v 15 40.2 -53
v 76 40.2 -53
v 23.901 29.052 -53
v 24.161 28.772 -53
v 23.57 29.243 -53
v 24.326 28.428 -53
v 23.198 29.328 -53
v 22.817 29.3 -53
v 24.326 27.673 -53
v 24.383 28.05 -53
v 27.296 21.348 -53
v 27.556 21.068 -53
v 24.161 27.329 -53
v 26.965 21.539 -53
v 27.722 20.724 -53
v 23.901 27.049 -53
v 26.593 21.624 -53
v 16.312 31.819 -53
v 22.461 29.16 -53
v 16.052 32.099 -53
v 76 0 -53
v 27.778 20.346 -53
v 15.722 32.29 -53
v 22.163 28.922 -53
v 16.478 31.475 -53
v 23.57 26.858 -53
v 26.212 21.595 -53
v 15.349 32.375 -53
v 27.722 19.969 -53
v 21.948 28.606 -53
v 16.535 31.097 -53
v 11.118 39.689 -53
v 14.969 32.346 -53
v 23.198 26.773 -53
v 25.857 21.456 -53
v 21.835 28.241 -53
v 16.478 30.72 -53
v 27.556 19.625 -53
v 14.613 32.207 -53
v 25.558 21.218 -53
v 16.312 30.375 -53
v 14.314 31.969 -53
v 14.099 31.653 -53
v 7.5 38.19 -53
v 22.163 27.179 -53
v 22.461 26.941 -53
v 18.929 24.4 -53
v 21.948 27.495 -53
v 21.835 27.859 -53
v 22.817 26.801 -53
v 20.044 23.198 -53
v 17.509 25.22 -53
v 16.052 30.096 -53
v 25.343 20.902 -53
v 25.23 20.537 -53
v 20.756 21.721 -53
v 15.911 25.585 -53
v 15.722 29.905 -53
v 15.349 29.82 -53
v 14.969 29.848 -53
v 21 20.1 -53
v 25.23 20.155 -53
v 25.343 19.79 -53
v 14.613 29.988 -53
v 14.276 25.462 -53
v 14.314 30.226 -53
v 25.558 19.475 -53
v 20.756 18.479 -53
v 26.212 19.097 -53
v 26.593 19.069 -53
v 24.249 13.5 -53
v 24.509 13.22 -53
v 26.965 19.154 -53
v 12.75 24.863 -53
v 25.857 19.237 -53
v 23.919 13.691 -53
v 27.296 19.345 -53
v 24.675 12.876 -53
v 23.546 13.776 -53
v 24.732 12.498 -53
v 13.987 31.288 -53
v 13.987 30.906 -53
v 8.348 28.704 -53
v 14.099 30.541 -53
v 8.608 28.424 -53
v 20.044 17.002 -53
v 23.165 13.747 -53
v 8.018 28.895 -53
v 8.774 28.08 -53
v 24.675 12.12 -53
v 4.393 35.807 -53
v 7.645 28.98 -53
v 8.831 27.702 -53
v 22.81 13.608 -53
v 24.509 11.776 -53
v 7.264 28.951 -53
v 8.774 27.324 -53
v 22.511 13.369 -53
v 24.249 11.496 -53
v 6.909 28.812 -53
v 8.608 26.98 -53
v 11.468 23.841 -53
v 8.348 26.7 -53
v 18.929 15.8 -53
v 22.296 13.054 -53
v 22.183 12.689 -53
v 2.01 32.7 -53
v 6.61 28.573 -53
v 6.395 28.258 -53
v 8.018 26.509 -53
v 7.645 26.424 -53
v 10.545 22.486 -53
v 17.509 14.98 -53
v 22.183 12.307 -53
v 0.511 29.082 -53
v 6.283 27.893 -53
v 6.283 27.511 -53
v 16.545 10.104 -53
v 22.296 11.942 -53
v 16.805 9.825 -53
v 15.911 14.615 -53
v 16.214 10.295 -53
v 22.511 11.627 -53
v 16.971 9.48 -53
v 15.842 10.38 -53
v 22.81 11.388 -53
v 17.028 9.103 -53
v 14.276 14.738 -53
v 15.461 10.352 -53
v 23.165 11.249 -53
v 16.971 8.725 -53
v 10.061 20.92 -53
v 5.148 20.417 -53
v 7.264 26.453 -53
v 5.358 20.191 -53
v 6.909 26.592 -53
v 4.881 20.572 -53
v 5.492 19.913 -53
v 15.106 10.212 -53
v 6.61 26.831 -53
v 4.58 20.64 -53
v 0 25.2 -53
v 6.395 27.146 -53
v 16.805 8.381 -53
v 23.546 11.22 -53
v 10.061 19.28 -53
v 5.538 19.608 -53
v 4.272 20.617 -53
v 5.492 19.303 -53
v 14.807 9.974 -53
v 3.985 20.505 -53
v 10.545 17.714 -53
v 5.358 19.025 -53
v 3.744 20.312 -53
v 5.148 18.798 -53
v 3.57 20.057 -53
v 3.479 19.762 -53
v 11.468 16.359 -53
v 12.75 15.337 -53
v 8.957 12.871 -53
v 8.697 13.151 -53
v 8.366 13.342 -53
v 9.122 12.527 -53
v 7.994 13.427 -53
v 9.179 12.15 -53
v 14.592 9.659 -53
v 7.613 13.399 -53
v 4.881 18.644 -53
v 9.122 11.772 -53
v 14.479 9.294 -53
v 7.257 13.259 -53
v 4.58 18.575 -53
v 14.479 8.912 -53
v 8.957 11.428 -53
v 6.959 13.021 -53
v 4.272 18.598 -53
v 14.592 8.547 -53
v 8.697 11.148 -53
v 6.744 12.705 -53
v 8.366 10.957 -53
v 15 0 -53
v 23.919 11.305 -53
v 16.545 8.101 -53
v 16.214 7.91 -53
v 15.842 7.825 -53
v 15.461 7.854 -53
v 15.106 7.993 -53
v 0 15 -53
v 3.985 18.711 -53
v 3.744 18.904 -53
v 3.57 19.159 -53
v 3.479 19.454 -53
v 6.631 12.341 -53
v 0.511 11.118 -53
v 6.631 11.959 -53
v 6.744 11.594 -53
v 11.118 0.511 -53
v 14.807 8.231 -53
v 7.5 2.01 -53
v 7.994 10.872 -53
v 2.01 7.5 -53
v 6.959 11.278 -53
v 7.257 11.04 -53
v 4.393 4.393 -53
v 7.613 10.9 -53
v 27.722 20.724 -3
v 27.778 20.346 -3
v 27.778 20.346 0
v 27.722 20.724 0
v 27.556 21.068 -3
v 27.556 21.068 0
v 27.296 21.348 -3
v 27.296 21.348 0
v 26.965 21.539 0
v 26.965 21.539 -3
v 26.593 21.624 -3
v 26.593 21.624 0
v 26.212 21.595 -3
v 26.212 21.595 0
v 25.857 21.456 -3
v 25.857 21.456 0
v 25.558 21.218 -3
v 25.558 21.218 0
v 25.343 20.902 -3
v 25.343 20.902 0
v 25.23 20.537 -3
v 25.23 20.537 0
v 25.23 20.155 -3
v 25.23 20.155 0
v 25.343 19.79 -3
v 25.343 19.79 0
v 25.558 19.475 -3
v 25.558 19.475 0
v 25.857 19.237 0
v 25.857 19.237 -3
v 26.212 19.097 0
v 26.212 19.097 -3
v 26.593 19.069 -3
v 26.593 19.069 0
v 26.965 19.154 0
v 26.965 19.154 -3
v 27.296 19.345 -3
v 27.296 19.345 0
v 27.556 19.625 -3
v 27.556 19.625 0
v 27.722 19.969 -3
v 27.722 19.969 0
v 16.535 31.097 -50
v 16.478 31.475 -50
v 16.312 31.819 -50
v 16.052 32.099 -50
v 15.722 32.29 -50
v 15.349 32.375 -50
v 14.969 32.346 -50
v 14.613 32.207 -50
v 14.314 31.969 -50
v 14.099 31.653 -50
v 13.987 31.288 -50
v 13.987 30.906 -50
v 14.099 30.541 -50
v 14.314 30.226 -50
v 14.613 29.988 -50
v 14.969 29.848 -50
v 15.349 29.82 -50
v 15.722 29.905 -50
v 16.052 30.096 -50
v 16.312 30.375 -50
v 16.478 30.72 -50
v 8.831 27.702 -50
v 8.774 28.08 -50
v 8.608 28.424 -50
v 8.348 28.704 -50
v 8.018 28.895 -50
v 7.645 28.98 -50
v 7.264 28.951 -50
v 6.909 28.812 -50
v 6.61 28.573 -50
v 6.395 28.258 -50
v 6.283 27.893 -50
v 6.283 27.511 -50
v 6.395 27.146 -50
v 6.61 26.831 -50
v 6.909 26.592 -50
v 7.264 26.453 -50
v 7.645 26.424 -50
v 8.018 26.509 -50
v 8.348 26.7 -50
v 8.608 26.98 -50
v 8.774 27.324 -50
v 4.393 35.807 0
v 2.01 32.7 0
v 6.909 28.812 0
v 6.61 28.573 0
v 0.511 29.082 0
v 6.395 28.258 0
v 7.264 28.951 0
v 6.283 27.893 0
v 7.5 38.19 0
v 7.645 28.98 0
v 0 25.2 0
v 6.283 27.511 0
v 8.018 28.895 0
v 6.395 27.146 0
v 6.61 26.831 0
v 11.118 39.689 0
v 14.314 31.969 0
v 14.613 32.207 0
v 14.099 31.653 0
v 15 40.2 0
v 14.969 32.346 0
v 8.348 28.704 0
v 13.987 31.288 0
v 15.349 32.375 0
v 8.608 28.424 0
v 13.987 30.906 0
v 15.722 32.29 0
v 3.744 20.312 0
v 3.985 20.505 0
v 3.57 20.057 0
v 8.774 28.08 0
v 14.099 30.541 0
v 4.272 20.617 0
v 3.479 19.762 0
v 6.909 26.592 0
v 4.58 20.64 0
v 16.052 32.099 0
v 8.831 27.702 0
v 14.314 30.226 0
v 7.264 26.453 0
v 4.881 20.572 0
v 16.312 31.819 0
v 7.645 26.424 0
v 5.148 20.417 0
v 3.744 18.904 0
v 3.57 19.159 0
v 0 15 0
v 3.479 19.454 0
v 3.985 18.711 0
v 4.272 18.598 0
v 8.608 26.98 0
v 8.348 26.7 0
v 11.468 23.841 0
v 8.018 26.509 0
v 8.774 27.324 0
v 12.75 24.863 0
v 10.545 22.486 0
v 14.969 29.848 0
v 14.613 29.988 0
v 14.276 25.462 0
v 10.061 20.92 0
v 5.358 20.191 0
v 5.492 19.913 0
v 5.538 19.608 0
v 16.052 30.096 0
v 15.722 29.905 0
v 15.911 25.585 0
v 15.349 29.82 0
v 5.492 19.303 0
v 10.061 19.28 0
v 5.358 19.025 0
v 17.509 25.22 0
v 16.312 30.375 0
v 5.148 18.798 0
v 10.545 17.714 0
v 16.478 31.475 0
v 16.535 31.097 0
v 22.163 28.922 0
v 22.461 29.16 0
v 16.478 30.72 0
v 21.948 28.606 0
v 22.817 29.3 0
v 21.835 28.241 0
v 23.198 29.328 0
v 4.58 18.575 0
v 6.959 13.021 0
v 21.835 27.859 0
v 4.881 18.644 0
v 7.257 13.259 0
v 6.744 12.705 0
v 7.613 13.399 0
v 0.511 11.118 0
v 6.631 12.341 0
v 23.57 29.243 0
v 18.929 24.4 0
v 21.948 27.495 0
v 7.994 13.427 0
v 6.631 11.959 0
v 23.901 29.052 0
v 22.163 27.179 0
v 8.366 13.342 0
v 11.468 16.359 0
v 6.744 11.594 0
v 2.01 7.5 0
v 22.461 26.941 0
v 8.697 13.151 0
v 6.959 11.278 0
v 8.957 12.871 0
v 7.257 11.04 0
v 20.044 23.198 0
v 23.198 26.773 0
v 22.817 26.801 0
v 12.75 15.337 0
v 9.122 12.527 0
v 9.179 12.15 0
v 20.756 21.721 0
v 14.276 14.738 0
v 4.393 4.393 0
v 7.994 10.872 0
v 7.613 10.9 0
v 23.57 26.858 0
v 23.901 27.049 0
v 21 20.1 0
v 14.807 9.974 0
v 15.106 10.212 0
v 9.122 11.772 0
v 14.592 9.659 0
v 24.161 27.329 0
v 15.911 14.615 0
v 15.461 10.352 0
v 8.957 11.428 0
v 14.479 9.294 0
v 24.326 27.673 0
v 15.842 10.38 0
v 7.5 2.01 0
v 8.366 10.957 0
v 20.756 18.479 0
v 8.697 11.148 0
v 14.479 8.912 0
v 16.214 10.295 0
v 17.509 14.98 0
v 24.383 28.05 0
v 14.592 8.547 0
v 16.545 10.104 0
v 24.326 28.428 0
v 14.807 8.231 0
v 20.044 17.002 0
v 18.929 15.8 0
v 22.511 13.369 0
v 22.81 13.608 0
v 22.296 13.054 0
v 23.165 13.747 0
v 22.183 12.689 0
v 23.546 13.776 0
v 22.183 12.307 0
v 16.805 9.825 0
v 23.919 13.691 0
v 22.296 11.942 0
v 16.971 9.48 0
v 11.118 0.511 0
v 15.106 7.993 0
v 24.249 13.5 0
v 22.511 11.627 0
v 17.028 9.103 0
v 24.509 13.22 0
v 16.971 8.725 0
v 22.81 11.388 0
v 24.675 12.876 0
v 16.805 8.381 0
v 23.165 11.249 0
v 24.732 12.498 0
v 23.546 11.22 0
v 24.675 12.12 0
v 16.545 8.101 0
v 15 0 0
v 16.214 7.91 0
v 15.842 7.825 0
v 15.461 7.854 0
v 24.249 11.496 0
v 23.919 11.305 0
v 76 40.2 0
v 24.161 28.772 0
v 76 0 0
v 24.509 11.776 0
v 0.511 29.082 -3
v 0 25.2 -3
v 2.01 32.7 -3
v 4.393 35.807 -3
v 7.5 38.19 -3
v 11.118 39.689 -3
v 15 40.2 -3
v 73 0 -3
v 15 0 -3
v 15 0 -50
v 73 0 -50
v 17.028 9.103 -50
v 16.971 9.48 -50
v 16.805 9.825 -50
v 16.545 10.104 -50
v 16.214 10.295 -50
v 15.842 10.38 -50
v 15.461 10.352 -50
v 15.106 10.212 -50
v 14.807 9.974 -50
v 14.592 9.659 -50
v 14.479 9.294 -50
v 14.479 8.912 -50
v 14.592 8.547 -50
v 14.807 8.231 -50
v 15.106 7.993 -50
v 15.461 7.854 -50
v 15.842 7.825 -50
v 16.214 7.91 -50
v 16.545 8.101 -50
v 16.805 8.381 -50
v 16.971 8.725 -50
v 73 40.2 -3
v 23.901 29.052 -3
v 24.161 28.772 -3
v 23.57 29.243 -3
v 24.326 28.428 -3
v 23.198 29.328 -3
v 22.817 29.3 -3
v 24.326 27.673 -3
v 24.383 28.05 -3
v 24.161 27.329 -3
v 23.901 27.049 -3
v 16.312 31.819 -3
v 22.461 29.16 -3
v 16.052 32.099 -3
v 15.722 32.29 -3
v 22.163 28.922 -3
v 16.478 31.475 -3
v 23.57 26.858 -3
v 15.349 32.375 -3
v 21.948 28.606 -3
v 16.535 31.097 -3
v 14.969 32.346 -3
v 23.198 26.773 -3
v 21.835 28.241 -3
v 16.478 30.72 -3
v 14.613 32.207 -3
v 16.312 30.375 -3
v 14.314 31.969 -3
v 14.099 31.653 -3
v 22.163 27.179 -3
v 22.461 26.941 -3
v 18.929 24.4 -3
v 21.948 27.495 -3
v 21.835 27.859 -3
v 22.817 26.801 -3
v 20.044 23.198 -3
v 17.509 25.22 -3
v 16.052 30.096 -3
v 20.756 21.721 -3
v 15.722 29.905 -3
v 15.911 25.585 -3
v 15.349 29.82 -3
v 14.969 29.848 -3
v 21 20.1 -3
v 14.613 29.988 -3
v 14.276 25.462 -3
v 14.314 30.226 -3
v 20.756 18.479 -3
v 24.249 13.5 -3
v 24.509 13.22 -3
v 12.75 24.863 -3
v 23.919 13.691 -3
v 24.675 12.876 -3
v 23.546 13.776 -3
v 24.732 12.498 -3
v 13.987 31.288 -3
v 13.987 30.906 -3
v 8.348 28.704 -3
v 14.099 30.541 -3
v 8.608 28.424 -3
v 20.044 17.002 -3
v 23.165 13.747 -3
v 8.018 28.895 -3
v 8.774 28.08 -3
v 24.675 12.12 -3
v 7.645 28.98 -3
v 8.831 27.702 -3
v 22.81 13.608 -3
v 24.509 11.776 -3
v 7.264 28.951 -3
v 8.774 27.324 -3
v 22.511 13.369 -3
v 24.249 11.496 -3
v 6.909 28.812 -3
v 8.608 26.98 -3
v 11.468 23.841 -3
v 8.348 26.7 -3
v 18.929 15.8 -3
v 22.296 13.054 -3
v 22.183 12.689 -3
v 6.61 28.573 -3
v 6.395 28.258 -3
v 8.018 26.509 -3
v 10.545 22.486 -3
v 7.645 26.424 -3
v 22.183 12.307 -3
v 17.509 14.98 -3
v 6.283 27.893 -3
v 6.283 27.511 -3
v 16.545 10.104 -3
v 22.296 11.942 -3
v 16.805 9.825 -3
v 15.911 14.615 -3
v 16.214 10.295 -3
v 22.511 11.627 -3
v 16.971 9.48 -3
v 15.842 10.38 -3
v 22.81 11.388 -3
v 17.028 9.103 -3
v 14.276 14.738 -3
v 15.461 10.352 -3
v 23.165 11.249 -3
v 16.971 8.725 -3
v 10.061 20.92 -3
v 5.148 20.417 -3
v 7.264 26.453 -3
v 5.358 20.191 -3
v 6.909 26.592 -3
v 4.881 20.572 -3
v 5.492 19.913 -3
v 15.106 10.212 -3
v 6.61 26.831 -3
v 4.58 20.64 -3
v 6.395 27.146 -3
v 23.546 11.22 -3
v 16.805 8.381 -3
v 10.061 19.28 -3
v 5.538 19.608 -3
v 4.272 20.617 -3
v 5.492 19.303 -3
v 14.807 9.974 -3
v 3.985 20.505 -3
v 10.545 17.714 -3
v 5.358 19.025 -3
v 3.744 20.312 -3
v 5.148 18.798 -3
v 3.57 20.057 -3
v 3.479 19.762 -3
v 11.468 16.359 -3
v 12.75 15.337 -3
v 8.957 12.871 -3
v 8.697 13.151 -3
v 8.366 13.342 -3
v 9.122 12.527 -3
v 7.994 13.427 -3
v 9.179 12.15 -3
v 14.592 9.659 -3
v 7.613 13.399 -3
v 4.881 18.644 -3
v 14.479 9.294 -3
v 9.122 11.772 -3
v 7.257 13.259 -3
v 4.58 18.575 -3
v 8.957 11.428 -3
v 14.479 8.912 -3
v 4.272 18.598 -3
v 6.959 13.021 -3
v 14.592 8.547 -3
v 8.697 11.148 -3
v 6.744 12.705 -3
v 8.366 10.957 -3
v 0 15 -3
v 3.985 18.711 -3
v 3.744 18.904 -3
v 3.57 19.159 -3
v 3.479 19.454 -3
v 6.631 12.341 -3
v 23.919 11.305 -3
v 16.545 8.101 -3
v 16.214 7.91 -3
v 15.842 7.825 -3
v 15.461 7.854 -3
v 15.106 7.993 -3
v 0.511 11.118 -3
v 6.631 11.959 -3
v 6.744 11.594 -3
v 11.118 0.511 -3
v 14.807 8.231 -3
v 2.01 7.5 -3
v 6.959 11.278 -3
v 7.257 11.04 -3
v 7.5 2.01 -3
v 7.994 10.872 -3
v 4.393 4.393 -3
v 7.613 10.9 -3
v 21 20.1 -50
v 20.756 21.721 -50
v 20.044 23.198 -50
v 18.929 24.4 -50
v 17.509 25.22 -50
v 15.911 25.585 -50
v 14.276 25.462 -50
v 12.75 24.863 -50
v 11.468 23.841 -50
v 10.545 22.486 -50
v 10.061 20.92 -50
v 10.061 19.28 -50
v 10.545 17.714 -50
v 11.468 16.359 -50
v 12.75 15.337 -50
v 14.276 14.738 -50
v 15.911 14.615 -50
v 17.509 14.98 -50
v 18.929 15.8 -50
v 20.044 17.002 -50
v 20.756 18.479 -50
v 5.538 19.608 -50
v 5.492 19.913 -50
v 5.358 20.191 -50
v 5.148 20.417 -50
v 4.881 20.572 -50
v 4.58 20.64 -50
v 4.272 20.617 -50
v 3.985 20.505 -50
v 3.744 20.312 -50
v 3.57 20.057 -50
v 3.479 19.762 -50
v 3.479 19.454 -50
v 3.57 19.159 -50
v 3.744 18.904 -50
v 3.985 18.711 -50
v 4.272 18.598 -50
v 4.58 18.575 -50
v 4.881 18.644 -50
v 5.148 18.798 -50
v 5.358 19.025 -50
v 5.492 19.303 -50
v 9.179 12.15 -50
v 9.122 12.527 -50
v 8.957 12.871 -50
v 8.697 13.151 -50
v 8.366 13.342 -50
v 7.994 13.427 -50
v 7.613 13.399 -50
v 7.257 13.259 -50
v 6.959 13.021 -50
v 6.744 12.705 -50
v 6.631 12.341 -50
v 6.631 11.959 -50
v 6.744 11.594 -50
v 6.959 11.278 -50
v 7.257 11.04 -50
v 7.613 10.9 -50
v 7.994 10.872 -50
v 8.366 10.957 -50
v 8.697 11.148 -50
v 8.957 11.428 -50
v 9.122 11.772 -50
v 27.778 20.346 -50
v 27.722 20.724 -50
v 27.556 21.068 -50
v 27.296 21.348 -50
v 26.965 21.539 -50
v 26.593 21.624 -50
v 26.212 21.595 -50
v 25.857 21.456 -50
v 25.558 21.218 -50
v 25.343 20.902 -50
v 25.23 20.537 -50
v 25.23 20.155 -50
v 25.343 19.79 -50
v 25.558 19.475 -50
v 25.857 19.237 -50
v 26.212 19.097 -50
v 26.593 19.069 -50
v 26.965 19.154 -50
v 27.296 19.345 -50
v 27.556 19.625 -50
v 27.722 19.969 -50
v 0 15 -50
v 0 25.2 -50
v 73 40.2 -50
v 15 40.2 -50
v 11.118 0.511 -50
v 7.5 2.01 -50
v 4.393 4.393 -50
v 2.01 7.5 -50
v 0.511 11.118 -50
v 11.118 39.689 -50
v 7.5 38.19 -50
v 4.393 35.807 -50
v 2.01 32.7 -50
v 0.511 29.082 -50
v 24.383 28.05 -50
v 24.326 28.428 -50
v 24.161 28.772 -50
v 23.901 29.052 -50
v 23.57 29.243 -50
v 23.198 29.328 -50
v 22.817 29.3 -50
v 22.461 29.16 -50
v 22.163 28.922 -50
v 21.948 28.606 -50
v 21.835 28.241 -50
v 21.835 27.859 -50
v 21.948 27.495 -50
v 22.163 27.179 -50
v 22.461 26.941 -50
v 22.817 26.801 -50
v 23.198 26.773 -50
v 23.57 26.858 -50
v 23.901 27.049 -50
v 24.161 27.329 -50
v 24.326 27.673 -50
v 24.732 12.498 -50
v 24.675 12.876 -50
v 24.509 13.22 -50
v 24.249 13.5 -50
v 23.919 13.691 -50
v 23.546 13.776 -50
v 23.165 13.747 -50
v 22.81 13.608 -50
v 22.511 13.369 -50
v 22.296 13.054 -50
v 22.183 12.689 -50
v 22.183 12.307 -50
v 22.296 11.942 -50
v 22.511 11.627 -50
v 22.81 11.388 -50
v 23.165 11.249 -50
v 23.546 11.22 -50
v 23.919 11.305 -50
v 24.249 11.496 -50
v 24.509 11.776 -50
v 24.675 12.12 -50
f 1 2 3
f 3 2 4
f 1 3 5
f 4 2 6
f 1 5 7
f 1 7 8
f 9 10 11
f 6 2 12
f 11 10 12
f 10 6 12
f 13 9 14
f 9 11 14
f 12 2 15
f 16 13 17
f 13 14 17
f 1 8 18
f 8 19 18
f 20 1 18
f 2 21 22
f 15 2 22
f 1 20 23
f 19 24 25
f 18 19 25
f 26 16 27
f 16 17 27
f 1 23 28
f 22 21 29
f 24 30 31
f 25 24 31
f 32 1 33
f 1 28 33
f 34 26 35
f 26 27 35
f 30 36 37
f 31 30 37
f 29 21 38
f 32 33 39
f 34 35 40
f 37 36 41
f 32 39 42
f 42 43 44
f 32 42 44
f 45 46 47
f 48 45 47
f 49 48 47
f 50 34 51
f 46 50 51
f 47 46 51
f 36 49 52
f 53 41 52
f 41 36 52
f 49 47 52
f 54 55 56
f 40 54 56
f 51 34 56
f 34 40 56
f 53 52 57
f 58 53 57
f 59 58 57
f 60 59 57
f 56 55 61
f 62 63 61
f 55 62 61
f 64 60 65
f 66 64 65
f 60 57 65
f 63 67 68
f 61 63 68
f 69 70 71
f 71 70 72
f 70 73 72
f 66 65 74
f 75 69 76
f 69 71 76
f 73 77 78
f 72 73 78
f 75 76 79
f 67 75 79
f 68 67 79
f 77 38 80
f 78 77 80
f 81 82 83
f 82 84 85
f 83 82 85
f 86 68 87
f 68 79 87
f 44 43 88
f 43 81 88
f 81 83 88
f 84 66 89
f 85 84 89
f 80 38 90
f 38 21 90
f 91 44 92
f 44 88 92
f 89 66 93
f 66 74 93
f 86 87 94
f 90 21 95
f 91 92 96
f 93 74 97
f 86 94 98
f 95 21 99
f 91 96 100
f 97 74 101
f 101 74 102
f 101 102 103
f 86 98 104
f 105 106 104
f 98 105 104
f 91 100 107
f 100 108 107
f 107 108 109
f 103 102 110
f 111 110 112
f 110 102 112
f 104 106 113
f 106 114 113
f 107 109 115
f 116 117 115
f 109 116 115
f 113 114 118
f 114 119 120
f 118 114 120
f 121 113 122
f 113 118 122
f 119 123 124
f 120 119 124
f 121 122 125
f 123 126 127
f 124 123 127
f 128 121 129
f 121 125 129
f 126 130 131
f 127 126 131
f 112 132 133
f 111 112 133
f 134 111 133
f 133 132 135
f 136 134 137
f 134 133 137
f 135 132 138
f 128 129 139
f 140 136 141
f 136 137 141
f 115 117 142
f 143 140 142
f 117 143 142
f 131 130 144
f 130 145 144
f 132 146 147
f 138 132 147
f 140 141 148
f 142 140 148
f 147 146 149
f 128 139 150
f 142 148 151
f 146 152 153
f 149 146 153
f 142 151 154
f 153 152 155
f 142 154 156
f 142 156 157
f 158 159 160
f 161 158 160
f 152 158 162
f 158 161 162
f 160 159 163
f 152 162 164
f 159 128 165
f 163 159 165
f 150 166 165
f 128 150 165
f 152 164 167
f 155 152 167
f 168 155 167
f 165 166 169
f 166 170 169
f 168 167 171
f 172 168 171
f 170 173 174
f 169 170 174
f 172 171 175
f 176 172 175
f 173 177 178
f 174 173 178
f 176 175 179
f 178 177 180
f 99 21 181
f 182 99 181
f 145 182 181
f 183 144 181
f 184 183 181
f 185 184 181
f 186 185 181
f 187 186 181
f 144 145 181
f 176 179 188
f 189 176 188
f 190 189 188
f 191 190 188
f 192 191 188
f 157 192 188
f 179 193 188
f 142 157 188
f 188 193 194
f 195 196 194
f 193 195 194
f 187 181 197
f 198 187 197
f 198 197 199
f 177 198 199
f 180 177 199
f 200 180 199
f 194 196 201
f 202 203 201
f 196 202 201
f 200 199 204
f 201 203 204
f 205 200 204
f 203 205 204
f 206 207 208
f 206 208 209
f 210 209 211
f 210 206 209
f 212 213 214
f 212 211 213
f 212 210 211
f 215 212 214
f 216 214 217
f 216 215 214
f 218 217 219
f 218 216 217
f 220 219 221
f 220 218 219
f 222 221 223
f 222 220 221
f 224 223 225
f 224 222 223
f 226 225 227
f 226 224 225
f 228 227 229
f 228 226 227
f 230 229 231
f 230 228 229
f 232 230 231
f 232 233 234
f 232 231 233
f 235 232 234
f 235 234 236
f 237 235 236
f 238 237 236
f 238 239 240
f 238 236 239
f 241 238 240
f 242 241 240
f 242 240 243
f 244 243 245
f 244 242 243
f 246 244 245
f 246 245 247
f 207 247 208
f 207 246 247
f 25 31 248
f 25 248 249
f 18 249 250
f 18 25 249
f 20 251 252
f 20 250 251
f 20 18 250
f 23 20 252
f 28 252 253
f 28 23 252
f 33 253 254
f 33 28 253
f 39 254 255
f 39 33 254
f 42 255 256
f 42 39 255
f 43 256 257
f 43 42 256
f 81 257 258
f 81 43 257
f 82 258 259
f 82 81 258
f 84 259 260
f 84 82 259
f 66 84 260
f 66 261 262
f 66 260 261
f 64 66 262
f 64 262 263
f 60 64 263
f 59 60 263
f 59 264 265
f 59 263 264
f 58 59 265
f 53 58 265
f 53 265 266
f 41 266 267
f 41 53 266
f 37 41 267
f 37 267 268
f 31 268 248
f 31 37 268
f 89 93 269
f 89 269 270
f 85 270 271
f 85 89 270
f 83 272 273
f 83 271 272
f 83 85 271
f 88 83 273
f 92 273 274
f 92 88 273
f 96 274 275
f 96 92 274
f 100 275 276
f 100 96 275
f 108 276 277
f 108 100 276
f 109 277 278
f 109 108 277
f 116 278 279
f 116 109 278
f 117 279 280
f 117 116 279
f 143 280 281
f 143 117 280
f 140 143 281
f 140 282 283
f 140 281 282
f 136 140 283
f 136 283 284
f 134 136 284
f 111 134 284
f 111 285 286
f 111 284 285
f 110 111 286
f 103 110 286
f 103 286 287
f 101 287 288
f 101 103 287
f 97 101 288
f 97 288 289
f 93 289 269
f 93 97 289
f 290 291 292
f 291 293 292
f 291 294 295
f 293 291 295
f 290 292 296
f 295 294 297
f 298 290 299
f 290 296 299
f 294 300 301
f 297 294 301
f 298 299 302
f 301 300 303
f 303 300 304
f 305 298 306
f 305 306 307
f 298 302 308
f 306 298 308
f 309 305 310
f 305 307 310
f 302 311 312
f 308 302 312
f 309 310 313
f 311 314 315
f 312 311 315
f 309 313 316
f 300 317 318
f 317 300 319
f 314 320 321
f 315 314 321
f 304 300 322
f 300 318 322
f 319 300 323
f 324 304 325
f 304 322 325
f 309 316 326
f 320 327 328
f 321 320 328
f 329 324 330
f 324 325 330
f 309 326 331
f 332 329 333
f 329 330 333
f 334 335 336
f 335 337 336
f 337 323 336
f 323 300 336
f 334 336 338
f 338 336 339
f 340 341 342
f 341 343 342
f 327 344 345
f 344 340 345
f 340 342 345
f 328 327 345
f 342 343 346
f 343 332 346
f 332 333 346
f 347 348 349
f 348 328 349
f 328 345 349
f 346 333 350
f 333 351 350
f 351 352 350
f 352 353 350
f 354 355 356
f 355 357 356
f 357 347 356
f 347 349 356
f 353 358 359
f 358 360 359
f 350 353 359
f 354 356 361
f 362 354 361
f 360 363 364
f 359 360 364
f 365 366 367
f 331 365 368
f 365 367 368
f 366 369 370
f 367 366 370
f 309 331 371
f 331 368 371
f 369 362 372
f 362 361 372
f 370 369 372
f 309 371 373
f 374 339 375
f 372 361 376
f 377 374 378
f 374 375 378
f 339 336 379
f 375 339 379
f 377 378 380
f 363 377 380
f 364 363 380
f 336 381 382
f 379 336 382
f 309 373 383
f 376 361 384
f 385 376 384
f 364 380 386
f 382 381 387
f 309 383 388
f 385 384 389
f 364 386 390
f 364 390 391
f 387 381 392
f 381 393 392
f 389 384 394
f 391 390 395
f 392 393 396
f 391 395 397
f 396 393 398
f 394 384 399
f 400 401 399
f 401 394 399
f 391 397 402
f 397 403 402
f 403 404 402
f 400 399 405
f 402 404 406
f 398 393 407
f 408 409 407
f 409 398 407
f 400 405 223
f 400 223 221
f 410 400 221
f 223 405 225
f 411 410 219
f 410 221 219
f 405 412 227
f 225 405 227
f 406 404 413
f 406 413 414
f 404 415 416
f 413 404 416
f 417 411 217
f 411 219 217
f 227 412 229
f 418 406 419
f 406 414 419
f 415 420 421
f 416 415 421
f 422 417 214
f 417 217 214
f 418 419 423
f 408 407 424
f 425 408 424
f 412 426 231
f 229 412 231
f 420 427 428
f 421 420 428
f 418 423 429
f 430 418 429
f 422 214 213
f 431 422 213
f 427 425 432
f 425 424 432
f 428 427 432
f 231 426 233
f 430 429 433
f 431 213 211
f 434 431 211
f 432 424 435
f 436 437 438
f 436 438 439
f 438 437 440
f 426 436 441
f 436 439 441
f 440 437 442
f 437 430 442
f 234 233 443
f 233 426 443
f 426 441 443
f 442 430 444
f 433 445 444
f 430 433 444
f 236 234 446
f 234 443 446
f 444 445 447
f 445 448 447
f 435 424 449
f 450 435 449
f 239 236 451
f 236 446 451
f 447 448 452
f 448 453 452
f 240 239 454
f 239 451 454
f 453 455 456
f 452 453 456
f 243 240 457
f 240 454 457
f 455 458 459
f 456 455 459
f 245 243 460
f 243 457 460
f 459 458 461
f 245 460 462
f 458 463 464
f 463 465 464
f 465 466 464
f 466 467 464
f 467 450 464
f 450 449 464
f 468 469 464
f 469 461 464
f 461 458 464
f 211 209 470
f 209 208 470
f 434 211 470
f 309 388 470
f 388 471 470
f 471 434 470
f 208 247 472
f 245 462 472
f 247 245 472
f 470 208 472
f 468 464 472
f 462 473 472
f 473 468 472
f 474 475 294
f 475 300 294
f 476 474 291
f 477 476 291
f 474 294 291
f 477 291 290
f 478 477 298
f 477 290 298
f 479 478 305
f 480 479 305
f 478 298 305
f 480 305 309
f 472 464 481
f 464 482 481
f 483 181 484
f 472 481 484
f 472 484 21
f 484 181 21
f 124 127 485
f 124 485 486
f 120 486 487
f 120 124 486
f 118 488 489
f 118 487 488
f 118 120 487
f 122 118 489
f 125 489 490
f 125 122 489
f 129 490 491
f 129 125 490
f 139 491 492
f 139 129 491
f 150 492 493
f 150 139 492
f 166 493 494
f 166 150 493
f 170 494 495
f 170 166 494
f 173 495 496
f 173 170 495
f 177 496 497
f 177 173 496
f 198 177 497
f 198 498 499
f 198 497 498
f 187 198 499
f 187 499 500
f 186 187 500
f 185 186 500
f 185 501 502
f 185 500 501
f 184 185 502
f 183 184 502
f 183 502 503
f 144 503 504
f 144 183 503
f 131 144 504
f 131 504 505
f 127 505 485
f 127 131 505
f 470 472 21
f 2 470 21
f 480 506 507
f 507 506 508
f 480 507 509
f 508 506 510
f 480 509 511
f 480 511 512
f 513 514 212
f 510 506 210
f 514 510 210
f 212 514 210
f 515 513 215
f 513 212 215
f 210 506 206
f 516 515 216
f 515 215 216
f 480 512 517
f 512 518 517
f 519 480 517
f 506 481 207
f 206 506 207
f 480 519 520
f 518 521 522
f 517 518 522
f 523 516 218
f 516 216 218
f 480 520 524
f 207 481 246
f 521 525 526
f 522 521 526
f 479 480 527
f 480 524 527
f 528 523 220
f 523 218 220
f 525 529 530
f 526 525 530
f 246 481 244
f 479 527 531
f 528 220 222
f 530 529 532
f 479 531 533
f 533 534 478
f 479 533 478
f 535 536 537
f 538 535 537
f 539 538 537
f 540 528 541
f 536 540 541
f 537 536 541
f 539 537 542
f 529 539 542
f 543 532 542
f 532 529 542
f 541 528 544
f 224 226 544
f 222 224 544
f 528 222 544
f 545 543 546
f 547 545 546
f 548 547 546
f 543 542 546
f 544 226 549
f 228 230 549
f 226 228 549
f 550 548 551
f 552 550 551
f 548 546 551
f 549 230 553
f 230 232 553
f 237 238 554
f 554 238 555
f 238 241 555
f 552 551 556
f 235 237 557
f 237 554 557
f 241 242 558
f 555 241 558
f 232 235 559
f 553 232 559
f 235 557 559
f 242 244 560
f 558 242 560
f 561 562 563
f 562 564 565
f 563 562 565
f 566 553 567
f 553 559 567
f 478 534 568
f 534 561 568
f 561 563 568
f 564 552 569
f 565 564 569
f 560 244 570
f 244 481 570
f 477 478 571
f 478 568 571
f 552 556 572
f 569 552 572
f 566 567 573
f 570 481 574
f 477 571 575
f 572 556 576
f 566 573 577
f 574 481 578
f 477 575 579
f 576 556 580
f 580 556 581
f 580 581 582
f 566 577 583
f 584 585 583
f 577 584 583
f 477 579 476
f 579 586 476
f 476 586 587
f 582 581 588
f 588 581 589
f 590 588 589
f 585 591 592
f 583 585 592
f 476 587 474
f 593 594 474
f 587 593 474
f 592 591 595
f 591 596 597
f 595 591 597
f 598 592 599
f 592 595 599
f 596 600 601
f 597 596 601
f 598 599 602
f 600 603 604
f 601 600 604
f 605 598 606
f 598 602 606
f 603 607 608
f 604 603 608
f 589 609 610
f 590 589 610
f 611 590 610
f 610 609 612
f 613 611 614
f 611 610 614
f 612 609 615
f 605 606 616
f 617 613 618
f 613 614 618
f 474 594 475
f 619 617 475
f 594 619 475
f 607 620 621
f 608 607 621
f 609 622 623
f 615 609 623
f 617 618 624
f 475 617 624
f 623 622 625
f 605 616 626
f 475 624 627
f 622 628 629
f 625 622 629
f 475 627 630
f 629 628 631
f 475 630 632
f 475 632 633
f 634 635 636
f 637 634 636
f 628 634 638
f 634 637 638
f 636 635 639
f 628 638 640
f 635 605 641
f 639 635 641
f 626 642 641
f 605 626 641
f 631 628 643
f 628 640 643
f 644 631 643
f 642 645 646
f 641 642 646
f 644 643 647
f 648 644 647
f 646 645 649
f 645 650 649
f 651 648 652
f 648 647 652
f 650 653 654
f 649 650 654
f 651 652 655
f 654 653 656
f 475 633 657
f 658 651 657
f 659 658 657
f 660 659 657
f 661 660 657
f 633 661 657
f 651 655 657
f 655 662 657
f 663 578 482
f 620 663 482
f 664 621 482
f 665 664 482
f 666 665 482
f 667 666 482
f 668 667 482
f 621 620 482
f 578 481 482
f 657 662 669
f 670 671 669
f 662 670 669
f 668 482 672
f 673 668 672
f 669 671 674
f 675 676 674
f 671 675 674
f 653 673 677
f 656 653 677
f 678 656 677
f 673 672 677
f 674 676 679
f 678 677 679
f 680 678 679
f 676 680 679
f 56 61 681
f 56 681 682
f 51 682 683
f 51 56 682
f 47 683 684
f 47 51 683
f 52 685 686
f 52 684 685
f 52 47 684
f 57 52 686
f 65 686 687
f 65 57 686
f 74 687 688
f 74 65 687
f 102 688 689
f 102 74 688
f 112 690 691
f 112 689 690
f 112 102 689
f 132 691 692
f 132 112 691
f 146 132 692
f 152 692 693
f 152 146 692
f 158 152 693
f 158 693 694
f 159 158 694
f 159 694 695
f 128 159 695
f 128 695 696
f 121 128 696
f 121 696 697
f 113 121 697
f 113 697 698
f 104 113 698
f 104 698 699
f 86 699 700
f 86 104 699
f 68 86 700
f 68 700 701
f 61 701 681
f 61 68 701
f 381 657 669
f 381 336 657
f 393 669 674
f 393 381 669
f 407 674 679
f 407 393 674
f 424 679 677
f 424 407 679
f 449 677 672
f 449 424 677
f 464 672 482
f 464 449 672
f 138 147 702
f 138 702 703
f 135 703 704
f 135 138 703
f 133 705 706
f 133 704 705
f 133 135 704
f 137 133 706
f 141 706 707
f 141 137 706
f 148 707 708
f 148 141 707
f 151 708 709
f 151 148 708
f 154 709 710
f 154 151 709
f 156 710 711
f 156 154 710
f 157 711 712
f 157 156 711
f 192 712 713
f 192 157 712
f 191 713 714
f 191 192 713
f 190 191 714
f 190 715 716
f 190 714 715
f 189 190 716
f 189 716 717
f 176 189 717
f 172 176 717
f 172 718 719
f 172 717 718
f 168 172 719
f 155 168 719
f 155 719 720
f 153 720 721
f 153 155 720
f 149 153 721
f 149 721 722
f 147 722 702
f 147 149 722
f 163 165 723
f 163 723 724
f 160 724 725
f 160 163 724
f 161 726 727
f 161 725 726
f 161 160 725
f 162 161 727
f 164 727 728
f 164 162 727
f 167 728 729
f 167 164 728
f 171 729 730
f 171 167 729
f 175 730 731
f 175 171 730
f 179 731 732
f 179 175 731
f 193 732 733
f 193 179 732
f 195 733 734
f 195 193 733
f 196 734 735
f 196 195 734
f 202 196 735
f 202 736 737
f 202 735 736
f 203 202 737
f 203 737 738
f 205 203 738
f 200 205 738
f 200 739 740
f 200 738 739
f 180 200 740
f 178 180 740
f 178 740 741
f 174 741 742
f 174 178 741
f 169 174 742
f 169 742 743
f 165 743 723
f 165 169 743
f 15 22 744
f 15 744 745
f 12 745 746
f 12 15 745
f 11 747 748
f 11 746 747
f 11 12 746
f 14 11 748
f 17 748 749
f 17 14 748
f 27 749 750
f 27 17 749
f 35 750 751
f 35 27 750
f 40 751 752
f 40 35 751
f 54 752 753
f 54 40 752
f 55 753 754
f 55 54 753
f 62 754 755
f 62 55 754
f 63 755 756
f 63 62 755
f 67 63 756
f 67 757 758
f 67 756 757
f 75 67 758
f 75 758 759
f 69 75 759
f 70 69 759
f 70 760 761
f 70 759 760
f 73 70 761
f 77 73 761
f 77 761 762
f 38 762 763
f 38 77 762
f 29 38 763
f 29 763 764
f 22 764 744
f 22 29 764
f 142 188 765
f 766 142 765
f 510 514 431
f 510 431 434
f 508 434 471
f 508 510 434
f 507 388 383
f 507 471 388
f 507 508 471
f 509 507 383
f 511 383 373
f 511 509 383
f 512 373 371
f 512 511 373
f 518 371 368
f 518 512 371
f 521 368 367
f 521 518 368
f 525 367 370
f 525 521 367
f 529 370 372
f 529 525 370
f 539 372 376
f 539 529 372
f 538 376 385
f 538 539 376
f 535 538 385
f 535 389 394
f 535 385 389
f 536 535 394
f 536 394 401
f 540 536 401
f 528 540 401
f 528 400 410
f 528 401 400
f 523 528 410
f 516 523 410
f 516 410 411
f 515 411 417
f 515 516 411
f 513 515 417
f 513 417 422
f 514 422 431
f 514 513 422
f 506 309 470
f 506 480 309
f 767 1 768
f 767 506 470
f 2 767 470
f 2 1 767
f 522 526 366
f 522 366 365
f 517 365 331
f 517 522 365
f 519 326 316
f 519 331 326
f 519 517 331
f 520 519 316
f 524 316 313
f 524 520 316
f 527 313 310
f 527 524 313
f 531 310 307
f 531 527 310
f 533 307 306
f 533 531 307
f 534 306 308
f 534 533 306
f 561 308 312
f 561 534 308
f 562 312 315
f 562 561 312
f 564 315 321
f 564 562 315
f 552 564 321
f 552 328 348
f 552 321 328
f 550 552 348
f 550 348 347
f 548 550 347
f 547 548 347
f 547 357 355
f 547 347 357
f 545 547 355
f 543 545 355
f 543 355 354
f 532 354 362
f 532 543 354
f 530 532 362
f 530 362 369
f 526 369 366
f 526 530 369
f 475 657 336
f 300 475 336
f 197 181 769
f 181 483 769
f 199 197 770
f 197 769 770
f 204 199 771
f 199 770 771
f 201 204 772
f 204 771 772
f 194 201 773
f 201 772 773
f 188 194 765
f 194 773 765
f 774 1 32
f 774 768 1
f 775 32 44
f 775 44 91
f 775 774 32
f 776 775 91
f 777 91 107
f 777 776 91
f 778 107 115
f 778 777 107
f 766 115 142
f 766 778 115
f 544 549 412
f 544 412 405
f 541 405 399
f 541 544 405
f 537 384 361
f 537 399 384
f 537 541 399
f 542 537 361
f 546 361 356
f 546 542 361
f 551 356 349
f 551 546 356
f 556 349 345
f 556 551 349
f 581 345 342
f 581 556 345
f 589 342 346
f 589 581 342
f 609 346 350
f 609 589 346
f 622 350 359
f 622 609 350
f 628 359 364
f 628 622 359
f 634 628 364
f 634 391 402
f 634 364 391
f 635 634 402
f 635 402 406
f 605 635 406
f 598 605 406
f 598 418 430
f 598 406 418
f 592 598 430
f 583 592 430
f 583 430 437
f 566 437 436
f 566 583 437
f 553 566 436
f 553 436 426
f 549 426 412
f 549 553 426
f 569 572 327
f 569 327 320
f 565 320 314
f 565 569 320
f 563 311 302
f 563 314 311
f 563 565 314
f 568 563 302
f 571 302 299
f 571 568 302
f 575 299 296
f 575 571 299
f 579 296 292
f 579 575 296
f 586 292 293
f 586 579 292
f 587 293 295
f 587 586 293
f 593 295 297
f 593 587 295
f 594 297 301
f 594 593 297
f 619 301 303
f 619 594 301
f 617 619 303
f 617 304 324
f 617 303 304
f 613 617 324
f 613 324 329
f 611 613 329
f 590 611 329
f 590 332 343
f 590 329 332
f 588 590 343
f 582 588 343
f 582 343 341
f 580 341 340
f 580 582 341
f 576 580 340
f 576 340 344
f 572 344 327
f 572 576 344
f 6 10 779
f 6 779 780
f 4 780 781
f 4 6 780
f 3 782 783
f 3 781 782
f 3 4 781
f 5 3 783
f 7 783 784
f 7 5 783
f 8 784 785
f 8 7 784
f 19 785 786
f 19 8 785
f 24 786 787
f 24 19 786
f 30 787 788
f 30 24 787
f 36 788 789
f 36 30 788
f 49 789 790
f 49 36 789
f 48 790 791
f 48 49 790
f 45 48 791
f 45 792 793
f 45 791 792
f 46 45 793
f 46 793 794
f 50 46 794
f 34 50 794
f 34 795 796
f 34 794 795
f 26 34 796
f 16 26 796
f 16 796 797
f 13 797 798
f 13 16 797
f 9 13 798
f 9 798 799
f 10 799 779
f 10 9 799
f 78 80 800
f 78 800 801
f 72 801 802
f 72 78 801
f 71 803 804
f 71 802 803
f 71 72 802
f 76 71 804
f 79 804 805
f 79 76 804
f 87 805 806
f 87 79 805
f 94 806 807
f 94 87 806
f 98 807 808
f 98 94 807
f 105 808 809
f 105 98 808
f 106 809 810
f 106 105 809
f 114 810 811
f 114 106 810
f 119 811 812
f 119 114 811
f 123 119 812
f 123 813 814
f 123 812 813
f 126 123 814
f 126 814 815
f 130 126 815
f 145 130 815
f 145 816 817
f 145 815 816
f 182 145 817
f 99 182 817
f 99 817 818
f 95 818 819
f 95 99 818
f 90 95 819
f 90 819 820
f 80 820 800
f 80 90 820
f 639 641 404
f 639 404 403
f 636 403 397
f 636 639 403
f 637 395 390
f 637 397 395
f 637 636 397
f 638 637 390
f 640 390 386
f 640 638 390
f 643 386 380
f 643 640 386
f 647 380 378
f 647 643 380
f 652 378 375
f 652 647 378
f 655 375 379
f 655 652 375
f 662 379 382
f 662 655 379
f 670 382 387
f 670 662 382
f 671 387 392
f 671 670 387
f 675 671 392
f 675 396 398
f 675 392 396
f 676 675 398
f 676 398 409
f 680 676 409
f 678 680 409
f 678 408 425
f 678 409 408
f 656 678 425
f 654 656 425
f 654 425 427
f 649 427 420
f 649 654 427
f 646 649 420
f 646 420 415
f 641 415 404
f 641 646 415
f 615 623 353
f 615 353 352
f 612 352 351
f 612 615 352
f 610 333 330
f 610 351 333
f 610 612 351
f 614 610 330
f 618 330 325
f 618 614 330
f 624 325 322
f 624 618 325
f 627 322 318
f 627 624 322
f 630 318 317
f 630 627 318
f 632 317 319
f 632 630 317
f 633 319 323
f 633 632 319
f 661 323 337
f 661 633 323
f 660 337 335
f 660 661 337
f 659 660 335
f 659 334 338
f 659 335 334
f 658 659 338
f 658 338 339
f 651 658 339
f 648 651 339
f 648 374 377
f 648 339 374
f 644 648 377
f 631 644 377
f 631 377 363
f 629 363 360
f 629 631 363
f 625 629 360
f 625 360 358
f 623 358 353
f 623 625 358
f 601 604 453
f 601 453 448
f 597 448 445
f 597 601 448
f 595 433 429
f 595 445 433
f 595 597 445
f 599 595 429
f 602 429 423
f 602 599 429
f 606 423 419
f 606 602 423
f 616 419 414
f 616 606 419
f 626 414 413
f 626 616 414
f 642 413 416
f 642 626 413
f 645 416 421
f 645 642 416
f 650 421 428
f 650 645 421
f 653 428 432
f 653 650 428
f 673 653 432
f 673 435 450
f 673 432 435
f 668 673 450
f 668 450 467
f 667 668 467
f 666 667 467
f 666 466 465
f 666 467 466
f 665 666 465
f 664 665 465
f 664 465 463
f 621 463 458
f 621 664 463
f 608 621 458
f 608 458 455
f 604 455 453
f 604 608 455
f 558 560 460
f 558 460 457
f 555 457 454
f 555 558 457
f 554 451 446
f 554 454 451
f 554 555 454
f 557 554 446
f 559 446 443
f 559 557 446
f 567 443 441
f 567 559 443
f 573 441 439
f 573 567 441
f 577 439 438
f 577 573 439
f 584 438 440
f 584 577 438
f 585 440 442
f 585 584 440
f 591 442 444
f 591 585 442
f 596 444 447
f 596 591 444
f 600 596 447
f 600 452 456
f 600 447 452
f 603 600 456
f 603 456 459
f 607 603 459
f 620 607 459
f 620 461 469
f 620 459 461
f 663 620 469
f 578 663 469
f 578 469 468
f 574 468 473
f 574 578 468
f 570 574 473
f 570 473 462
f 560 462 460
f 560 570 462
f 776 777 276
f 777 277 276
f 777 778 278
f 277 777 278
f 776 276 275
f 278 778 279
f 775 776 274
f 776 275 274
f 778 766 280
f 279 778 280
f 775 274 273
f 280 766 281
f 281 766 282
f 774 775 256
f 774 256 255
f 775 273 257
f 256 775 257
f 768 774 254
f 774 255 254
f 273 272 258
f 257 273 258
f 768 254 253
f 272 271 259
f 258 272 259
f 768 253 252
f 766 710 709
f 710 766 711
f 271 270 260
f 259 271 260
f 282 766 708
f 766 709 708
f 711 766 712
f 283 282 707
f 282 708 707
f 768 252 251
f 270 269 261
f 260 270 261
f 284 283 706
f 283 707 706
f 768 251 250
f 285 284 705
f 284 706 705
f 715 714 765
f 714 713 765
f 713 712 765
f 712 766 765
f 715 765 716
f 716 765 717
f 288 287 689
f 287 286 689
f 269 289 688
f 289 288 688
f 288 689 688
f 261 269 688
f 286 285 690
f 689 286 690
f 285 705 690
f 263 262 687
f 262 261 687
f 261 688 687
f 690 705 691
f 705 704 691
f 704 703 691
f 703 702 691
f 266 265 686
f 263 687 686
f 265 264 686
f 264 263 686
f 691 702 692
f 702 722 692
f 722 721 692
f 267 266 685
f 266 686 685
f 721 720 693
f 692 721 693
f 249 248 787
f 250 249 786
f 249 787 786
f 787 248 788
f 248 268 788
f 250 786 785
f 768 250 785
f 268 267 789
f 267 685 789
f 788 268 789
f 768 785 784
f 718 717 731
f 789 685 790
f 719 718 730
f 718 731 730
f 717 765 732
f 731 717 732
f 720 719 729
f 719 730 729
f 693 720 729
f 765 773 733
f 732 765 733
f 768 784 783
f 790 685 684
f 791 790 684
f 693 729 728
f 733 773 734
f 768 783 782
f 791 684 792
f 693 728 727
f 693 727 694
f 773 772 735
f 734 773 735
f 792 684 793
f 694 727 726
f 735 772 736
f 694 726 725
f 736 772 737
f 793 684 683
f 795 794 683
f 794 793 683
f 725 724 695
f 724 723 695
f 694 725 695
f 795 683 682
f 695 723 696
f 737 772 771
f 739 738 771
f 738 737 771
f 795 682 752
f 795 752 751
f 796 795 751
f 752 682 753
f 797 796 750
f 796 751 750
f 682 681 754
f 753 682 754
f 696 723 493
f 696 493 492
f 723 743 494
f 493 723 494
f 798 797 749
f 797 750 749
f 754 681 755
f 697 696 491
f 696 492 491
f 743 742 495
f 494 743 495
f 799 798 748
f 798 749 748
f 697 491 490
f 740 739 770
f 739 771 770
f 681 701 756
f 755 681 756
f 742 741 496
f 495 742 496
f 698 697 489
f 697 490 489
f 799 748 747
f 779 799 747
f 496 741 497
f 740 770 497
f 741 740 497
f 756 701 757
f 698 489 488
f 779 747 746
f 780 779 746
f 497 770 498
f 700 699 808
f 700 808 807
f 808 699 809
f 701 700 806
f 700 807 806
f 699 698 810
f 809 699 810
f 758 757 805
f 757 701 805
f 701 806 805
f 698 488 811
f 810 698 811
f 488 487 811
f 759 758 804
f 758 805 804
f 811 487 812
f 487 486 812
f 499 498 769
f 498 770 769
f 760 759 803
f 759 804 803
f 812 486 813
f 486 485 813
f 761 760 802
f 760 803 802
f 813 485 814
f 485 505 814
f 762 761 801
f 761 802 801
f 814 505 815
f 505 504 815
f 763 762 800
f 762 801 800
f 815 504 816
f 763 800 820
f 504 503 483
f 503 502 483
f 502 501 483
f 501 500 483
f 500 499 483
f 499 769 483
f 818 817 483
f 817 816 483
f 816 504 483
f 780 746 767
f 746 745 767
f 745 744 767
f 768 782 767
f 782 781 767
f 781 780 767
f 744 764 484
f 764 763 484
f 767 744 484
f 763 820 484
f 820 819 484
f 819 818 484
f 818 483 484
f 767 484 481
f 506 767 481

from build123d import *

# Parameters (mm, degrees)
BOSS_EXTRUDE1_DEPTH     = 40.2
CUT_EXTRUDE1_DEPTH      = 102.00019802
CUT_EXTRUDE1_DEPTH_BACK = 102.00019802
SKETCH2_R               = 5.5
FILLET1_R               = 15
CUT_EXTRUDE2_DEPTH      = 100.458735162
CUT_EXTRUDE2_DEPTH_BACK = 100.458735162
SKETCH4_R               = 1.28125
SKETCH4_R_2             = 1.035449613


with BuildPart() as part:
    # Sketch1 → Boss-Extrude1 (new body)
    with BuildSketch(Plane(origin=(0, 0, 0), x_dir=(1, 0, 0), z_dir=(0, 1, 0))):
        Polygon((0, 3), (0, 0), (76, 0), (76, 53), (0, 53), (0, 50), (73, 50), (73, 3), align=None)
    extrude(amount=BOSS_EXTRUDE1_DEPTH)

    # Sketch2 → Cut-Extrude1 (cut, two sides: drawn at the far end of the back side and taken through both)
    with BuildSketch(Plane.XY.offset(-CUT_EXTRUDE1_DEPTH_BACK)):
        with Locations((15.5, 20.1)):
            Circle(SKETCH2_R)
    extrude(amount=CUT_EXTRUDE1_DEPTH + CUT_EXTRUDE1_DEPTH_BACK, mode=Mode.SUBTRACT)

    # Fillet1
    fillet1_edges = [part.edges().sort_by_distance(p)[0] for p in [
        (0, 0, -1.5),
        (0, 40.2, -1.5),
        (0, 40.2, -51.5),
        (0, 0, -51.5),
    ]]
    fillet(fillet1_edges, radius=FILLET1_R)

    # Sketch4 → Cut-Extrude2 (cut, two sides: drawn at the far end of the back side and taken through both)
    with BuildSketch(Plane.XY.offset(-50).offset(-CUT_EXTRUDE2_DEPTH_BACK)):
        with Locations((15.746359238, 9.102759113)):
            Circle(SKETCH4_R)
        with Locations((7.897978682, 12.149574107)):
            Circle(SKETCH4_R)
        with Locations((4.502759113, 19.607840375)):
            Circle(SKETCH4_R_2)
        with Locations((7.549574107, 27.702021318)):
            Circle(SKETCH4_R)
        with Locations((23.450425893, 12.497978682)):
            Circle(SKETCH4_R)
        with Locations((15.253640762, 31.097240887)):
            Circle(SKETCH4_R)
        with Locations((23.102021318, 28.050425893)):
            Circle(SKETCH4_R)
        with Locations((26.497240887, 20.346359238)):
            Circle(SKETCH4_R)
    extrude(amount=CUT_EXTRUDE2_DEPTH + CUT_EXTRUDE2_DEPTH_BACK, mode=Mode.SUBTRACT)


solid = part.part
